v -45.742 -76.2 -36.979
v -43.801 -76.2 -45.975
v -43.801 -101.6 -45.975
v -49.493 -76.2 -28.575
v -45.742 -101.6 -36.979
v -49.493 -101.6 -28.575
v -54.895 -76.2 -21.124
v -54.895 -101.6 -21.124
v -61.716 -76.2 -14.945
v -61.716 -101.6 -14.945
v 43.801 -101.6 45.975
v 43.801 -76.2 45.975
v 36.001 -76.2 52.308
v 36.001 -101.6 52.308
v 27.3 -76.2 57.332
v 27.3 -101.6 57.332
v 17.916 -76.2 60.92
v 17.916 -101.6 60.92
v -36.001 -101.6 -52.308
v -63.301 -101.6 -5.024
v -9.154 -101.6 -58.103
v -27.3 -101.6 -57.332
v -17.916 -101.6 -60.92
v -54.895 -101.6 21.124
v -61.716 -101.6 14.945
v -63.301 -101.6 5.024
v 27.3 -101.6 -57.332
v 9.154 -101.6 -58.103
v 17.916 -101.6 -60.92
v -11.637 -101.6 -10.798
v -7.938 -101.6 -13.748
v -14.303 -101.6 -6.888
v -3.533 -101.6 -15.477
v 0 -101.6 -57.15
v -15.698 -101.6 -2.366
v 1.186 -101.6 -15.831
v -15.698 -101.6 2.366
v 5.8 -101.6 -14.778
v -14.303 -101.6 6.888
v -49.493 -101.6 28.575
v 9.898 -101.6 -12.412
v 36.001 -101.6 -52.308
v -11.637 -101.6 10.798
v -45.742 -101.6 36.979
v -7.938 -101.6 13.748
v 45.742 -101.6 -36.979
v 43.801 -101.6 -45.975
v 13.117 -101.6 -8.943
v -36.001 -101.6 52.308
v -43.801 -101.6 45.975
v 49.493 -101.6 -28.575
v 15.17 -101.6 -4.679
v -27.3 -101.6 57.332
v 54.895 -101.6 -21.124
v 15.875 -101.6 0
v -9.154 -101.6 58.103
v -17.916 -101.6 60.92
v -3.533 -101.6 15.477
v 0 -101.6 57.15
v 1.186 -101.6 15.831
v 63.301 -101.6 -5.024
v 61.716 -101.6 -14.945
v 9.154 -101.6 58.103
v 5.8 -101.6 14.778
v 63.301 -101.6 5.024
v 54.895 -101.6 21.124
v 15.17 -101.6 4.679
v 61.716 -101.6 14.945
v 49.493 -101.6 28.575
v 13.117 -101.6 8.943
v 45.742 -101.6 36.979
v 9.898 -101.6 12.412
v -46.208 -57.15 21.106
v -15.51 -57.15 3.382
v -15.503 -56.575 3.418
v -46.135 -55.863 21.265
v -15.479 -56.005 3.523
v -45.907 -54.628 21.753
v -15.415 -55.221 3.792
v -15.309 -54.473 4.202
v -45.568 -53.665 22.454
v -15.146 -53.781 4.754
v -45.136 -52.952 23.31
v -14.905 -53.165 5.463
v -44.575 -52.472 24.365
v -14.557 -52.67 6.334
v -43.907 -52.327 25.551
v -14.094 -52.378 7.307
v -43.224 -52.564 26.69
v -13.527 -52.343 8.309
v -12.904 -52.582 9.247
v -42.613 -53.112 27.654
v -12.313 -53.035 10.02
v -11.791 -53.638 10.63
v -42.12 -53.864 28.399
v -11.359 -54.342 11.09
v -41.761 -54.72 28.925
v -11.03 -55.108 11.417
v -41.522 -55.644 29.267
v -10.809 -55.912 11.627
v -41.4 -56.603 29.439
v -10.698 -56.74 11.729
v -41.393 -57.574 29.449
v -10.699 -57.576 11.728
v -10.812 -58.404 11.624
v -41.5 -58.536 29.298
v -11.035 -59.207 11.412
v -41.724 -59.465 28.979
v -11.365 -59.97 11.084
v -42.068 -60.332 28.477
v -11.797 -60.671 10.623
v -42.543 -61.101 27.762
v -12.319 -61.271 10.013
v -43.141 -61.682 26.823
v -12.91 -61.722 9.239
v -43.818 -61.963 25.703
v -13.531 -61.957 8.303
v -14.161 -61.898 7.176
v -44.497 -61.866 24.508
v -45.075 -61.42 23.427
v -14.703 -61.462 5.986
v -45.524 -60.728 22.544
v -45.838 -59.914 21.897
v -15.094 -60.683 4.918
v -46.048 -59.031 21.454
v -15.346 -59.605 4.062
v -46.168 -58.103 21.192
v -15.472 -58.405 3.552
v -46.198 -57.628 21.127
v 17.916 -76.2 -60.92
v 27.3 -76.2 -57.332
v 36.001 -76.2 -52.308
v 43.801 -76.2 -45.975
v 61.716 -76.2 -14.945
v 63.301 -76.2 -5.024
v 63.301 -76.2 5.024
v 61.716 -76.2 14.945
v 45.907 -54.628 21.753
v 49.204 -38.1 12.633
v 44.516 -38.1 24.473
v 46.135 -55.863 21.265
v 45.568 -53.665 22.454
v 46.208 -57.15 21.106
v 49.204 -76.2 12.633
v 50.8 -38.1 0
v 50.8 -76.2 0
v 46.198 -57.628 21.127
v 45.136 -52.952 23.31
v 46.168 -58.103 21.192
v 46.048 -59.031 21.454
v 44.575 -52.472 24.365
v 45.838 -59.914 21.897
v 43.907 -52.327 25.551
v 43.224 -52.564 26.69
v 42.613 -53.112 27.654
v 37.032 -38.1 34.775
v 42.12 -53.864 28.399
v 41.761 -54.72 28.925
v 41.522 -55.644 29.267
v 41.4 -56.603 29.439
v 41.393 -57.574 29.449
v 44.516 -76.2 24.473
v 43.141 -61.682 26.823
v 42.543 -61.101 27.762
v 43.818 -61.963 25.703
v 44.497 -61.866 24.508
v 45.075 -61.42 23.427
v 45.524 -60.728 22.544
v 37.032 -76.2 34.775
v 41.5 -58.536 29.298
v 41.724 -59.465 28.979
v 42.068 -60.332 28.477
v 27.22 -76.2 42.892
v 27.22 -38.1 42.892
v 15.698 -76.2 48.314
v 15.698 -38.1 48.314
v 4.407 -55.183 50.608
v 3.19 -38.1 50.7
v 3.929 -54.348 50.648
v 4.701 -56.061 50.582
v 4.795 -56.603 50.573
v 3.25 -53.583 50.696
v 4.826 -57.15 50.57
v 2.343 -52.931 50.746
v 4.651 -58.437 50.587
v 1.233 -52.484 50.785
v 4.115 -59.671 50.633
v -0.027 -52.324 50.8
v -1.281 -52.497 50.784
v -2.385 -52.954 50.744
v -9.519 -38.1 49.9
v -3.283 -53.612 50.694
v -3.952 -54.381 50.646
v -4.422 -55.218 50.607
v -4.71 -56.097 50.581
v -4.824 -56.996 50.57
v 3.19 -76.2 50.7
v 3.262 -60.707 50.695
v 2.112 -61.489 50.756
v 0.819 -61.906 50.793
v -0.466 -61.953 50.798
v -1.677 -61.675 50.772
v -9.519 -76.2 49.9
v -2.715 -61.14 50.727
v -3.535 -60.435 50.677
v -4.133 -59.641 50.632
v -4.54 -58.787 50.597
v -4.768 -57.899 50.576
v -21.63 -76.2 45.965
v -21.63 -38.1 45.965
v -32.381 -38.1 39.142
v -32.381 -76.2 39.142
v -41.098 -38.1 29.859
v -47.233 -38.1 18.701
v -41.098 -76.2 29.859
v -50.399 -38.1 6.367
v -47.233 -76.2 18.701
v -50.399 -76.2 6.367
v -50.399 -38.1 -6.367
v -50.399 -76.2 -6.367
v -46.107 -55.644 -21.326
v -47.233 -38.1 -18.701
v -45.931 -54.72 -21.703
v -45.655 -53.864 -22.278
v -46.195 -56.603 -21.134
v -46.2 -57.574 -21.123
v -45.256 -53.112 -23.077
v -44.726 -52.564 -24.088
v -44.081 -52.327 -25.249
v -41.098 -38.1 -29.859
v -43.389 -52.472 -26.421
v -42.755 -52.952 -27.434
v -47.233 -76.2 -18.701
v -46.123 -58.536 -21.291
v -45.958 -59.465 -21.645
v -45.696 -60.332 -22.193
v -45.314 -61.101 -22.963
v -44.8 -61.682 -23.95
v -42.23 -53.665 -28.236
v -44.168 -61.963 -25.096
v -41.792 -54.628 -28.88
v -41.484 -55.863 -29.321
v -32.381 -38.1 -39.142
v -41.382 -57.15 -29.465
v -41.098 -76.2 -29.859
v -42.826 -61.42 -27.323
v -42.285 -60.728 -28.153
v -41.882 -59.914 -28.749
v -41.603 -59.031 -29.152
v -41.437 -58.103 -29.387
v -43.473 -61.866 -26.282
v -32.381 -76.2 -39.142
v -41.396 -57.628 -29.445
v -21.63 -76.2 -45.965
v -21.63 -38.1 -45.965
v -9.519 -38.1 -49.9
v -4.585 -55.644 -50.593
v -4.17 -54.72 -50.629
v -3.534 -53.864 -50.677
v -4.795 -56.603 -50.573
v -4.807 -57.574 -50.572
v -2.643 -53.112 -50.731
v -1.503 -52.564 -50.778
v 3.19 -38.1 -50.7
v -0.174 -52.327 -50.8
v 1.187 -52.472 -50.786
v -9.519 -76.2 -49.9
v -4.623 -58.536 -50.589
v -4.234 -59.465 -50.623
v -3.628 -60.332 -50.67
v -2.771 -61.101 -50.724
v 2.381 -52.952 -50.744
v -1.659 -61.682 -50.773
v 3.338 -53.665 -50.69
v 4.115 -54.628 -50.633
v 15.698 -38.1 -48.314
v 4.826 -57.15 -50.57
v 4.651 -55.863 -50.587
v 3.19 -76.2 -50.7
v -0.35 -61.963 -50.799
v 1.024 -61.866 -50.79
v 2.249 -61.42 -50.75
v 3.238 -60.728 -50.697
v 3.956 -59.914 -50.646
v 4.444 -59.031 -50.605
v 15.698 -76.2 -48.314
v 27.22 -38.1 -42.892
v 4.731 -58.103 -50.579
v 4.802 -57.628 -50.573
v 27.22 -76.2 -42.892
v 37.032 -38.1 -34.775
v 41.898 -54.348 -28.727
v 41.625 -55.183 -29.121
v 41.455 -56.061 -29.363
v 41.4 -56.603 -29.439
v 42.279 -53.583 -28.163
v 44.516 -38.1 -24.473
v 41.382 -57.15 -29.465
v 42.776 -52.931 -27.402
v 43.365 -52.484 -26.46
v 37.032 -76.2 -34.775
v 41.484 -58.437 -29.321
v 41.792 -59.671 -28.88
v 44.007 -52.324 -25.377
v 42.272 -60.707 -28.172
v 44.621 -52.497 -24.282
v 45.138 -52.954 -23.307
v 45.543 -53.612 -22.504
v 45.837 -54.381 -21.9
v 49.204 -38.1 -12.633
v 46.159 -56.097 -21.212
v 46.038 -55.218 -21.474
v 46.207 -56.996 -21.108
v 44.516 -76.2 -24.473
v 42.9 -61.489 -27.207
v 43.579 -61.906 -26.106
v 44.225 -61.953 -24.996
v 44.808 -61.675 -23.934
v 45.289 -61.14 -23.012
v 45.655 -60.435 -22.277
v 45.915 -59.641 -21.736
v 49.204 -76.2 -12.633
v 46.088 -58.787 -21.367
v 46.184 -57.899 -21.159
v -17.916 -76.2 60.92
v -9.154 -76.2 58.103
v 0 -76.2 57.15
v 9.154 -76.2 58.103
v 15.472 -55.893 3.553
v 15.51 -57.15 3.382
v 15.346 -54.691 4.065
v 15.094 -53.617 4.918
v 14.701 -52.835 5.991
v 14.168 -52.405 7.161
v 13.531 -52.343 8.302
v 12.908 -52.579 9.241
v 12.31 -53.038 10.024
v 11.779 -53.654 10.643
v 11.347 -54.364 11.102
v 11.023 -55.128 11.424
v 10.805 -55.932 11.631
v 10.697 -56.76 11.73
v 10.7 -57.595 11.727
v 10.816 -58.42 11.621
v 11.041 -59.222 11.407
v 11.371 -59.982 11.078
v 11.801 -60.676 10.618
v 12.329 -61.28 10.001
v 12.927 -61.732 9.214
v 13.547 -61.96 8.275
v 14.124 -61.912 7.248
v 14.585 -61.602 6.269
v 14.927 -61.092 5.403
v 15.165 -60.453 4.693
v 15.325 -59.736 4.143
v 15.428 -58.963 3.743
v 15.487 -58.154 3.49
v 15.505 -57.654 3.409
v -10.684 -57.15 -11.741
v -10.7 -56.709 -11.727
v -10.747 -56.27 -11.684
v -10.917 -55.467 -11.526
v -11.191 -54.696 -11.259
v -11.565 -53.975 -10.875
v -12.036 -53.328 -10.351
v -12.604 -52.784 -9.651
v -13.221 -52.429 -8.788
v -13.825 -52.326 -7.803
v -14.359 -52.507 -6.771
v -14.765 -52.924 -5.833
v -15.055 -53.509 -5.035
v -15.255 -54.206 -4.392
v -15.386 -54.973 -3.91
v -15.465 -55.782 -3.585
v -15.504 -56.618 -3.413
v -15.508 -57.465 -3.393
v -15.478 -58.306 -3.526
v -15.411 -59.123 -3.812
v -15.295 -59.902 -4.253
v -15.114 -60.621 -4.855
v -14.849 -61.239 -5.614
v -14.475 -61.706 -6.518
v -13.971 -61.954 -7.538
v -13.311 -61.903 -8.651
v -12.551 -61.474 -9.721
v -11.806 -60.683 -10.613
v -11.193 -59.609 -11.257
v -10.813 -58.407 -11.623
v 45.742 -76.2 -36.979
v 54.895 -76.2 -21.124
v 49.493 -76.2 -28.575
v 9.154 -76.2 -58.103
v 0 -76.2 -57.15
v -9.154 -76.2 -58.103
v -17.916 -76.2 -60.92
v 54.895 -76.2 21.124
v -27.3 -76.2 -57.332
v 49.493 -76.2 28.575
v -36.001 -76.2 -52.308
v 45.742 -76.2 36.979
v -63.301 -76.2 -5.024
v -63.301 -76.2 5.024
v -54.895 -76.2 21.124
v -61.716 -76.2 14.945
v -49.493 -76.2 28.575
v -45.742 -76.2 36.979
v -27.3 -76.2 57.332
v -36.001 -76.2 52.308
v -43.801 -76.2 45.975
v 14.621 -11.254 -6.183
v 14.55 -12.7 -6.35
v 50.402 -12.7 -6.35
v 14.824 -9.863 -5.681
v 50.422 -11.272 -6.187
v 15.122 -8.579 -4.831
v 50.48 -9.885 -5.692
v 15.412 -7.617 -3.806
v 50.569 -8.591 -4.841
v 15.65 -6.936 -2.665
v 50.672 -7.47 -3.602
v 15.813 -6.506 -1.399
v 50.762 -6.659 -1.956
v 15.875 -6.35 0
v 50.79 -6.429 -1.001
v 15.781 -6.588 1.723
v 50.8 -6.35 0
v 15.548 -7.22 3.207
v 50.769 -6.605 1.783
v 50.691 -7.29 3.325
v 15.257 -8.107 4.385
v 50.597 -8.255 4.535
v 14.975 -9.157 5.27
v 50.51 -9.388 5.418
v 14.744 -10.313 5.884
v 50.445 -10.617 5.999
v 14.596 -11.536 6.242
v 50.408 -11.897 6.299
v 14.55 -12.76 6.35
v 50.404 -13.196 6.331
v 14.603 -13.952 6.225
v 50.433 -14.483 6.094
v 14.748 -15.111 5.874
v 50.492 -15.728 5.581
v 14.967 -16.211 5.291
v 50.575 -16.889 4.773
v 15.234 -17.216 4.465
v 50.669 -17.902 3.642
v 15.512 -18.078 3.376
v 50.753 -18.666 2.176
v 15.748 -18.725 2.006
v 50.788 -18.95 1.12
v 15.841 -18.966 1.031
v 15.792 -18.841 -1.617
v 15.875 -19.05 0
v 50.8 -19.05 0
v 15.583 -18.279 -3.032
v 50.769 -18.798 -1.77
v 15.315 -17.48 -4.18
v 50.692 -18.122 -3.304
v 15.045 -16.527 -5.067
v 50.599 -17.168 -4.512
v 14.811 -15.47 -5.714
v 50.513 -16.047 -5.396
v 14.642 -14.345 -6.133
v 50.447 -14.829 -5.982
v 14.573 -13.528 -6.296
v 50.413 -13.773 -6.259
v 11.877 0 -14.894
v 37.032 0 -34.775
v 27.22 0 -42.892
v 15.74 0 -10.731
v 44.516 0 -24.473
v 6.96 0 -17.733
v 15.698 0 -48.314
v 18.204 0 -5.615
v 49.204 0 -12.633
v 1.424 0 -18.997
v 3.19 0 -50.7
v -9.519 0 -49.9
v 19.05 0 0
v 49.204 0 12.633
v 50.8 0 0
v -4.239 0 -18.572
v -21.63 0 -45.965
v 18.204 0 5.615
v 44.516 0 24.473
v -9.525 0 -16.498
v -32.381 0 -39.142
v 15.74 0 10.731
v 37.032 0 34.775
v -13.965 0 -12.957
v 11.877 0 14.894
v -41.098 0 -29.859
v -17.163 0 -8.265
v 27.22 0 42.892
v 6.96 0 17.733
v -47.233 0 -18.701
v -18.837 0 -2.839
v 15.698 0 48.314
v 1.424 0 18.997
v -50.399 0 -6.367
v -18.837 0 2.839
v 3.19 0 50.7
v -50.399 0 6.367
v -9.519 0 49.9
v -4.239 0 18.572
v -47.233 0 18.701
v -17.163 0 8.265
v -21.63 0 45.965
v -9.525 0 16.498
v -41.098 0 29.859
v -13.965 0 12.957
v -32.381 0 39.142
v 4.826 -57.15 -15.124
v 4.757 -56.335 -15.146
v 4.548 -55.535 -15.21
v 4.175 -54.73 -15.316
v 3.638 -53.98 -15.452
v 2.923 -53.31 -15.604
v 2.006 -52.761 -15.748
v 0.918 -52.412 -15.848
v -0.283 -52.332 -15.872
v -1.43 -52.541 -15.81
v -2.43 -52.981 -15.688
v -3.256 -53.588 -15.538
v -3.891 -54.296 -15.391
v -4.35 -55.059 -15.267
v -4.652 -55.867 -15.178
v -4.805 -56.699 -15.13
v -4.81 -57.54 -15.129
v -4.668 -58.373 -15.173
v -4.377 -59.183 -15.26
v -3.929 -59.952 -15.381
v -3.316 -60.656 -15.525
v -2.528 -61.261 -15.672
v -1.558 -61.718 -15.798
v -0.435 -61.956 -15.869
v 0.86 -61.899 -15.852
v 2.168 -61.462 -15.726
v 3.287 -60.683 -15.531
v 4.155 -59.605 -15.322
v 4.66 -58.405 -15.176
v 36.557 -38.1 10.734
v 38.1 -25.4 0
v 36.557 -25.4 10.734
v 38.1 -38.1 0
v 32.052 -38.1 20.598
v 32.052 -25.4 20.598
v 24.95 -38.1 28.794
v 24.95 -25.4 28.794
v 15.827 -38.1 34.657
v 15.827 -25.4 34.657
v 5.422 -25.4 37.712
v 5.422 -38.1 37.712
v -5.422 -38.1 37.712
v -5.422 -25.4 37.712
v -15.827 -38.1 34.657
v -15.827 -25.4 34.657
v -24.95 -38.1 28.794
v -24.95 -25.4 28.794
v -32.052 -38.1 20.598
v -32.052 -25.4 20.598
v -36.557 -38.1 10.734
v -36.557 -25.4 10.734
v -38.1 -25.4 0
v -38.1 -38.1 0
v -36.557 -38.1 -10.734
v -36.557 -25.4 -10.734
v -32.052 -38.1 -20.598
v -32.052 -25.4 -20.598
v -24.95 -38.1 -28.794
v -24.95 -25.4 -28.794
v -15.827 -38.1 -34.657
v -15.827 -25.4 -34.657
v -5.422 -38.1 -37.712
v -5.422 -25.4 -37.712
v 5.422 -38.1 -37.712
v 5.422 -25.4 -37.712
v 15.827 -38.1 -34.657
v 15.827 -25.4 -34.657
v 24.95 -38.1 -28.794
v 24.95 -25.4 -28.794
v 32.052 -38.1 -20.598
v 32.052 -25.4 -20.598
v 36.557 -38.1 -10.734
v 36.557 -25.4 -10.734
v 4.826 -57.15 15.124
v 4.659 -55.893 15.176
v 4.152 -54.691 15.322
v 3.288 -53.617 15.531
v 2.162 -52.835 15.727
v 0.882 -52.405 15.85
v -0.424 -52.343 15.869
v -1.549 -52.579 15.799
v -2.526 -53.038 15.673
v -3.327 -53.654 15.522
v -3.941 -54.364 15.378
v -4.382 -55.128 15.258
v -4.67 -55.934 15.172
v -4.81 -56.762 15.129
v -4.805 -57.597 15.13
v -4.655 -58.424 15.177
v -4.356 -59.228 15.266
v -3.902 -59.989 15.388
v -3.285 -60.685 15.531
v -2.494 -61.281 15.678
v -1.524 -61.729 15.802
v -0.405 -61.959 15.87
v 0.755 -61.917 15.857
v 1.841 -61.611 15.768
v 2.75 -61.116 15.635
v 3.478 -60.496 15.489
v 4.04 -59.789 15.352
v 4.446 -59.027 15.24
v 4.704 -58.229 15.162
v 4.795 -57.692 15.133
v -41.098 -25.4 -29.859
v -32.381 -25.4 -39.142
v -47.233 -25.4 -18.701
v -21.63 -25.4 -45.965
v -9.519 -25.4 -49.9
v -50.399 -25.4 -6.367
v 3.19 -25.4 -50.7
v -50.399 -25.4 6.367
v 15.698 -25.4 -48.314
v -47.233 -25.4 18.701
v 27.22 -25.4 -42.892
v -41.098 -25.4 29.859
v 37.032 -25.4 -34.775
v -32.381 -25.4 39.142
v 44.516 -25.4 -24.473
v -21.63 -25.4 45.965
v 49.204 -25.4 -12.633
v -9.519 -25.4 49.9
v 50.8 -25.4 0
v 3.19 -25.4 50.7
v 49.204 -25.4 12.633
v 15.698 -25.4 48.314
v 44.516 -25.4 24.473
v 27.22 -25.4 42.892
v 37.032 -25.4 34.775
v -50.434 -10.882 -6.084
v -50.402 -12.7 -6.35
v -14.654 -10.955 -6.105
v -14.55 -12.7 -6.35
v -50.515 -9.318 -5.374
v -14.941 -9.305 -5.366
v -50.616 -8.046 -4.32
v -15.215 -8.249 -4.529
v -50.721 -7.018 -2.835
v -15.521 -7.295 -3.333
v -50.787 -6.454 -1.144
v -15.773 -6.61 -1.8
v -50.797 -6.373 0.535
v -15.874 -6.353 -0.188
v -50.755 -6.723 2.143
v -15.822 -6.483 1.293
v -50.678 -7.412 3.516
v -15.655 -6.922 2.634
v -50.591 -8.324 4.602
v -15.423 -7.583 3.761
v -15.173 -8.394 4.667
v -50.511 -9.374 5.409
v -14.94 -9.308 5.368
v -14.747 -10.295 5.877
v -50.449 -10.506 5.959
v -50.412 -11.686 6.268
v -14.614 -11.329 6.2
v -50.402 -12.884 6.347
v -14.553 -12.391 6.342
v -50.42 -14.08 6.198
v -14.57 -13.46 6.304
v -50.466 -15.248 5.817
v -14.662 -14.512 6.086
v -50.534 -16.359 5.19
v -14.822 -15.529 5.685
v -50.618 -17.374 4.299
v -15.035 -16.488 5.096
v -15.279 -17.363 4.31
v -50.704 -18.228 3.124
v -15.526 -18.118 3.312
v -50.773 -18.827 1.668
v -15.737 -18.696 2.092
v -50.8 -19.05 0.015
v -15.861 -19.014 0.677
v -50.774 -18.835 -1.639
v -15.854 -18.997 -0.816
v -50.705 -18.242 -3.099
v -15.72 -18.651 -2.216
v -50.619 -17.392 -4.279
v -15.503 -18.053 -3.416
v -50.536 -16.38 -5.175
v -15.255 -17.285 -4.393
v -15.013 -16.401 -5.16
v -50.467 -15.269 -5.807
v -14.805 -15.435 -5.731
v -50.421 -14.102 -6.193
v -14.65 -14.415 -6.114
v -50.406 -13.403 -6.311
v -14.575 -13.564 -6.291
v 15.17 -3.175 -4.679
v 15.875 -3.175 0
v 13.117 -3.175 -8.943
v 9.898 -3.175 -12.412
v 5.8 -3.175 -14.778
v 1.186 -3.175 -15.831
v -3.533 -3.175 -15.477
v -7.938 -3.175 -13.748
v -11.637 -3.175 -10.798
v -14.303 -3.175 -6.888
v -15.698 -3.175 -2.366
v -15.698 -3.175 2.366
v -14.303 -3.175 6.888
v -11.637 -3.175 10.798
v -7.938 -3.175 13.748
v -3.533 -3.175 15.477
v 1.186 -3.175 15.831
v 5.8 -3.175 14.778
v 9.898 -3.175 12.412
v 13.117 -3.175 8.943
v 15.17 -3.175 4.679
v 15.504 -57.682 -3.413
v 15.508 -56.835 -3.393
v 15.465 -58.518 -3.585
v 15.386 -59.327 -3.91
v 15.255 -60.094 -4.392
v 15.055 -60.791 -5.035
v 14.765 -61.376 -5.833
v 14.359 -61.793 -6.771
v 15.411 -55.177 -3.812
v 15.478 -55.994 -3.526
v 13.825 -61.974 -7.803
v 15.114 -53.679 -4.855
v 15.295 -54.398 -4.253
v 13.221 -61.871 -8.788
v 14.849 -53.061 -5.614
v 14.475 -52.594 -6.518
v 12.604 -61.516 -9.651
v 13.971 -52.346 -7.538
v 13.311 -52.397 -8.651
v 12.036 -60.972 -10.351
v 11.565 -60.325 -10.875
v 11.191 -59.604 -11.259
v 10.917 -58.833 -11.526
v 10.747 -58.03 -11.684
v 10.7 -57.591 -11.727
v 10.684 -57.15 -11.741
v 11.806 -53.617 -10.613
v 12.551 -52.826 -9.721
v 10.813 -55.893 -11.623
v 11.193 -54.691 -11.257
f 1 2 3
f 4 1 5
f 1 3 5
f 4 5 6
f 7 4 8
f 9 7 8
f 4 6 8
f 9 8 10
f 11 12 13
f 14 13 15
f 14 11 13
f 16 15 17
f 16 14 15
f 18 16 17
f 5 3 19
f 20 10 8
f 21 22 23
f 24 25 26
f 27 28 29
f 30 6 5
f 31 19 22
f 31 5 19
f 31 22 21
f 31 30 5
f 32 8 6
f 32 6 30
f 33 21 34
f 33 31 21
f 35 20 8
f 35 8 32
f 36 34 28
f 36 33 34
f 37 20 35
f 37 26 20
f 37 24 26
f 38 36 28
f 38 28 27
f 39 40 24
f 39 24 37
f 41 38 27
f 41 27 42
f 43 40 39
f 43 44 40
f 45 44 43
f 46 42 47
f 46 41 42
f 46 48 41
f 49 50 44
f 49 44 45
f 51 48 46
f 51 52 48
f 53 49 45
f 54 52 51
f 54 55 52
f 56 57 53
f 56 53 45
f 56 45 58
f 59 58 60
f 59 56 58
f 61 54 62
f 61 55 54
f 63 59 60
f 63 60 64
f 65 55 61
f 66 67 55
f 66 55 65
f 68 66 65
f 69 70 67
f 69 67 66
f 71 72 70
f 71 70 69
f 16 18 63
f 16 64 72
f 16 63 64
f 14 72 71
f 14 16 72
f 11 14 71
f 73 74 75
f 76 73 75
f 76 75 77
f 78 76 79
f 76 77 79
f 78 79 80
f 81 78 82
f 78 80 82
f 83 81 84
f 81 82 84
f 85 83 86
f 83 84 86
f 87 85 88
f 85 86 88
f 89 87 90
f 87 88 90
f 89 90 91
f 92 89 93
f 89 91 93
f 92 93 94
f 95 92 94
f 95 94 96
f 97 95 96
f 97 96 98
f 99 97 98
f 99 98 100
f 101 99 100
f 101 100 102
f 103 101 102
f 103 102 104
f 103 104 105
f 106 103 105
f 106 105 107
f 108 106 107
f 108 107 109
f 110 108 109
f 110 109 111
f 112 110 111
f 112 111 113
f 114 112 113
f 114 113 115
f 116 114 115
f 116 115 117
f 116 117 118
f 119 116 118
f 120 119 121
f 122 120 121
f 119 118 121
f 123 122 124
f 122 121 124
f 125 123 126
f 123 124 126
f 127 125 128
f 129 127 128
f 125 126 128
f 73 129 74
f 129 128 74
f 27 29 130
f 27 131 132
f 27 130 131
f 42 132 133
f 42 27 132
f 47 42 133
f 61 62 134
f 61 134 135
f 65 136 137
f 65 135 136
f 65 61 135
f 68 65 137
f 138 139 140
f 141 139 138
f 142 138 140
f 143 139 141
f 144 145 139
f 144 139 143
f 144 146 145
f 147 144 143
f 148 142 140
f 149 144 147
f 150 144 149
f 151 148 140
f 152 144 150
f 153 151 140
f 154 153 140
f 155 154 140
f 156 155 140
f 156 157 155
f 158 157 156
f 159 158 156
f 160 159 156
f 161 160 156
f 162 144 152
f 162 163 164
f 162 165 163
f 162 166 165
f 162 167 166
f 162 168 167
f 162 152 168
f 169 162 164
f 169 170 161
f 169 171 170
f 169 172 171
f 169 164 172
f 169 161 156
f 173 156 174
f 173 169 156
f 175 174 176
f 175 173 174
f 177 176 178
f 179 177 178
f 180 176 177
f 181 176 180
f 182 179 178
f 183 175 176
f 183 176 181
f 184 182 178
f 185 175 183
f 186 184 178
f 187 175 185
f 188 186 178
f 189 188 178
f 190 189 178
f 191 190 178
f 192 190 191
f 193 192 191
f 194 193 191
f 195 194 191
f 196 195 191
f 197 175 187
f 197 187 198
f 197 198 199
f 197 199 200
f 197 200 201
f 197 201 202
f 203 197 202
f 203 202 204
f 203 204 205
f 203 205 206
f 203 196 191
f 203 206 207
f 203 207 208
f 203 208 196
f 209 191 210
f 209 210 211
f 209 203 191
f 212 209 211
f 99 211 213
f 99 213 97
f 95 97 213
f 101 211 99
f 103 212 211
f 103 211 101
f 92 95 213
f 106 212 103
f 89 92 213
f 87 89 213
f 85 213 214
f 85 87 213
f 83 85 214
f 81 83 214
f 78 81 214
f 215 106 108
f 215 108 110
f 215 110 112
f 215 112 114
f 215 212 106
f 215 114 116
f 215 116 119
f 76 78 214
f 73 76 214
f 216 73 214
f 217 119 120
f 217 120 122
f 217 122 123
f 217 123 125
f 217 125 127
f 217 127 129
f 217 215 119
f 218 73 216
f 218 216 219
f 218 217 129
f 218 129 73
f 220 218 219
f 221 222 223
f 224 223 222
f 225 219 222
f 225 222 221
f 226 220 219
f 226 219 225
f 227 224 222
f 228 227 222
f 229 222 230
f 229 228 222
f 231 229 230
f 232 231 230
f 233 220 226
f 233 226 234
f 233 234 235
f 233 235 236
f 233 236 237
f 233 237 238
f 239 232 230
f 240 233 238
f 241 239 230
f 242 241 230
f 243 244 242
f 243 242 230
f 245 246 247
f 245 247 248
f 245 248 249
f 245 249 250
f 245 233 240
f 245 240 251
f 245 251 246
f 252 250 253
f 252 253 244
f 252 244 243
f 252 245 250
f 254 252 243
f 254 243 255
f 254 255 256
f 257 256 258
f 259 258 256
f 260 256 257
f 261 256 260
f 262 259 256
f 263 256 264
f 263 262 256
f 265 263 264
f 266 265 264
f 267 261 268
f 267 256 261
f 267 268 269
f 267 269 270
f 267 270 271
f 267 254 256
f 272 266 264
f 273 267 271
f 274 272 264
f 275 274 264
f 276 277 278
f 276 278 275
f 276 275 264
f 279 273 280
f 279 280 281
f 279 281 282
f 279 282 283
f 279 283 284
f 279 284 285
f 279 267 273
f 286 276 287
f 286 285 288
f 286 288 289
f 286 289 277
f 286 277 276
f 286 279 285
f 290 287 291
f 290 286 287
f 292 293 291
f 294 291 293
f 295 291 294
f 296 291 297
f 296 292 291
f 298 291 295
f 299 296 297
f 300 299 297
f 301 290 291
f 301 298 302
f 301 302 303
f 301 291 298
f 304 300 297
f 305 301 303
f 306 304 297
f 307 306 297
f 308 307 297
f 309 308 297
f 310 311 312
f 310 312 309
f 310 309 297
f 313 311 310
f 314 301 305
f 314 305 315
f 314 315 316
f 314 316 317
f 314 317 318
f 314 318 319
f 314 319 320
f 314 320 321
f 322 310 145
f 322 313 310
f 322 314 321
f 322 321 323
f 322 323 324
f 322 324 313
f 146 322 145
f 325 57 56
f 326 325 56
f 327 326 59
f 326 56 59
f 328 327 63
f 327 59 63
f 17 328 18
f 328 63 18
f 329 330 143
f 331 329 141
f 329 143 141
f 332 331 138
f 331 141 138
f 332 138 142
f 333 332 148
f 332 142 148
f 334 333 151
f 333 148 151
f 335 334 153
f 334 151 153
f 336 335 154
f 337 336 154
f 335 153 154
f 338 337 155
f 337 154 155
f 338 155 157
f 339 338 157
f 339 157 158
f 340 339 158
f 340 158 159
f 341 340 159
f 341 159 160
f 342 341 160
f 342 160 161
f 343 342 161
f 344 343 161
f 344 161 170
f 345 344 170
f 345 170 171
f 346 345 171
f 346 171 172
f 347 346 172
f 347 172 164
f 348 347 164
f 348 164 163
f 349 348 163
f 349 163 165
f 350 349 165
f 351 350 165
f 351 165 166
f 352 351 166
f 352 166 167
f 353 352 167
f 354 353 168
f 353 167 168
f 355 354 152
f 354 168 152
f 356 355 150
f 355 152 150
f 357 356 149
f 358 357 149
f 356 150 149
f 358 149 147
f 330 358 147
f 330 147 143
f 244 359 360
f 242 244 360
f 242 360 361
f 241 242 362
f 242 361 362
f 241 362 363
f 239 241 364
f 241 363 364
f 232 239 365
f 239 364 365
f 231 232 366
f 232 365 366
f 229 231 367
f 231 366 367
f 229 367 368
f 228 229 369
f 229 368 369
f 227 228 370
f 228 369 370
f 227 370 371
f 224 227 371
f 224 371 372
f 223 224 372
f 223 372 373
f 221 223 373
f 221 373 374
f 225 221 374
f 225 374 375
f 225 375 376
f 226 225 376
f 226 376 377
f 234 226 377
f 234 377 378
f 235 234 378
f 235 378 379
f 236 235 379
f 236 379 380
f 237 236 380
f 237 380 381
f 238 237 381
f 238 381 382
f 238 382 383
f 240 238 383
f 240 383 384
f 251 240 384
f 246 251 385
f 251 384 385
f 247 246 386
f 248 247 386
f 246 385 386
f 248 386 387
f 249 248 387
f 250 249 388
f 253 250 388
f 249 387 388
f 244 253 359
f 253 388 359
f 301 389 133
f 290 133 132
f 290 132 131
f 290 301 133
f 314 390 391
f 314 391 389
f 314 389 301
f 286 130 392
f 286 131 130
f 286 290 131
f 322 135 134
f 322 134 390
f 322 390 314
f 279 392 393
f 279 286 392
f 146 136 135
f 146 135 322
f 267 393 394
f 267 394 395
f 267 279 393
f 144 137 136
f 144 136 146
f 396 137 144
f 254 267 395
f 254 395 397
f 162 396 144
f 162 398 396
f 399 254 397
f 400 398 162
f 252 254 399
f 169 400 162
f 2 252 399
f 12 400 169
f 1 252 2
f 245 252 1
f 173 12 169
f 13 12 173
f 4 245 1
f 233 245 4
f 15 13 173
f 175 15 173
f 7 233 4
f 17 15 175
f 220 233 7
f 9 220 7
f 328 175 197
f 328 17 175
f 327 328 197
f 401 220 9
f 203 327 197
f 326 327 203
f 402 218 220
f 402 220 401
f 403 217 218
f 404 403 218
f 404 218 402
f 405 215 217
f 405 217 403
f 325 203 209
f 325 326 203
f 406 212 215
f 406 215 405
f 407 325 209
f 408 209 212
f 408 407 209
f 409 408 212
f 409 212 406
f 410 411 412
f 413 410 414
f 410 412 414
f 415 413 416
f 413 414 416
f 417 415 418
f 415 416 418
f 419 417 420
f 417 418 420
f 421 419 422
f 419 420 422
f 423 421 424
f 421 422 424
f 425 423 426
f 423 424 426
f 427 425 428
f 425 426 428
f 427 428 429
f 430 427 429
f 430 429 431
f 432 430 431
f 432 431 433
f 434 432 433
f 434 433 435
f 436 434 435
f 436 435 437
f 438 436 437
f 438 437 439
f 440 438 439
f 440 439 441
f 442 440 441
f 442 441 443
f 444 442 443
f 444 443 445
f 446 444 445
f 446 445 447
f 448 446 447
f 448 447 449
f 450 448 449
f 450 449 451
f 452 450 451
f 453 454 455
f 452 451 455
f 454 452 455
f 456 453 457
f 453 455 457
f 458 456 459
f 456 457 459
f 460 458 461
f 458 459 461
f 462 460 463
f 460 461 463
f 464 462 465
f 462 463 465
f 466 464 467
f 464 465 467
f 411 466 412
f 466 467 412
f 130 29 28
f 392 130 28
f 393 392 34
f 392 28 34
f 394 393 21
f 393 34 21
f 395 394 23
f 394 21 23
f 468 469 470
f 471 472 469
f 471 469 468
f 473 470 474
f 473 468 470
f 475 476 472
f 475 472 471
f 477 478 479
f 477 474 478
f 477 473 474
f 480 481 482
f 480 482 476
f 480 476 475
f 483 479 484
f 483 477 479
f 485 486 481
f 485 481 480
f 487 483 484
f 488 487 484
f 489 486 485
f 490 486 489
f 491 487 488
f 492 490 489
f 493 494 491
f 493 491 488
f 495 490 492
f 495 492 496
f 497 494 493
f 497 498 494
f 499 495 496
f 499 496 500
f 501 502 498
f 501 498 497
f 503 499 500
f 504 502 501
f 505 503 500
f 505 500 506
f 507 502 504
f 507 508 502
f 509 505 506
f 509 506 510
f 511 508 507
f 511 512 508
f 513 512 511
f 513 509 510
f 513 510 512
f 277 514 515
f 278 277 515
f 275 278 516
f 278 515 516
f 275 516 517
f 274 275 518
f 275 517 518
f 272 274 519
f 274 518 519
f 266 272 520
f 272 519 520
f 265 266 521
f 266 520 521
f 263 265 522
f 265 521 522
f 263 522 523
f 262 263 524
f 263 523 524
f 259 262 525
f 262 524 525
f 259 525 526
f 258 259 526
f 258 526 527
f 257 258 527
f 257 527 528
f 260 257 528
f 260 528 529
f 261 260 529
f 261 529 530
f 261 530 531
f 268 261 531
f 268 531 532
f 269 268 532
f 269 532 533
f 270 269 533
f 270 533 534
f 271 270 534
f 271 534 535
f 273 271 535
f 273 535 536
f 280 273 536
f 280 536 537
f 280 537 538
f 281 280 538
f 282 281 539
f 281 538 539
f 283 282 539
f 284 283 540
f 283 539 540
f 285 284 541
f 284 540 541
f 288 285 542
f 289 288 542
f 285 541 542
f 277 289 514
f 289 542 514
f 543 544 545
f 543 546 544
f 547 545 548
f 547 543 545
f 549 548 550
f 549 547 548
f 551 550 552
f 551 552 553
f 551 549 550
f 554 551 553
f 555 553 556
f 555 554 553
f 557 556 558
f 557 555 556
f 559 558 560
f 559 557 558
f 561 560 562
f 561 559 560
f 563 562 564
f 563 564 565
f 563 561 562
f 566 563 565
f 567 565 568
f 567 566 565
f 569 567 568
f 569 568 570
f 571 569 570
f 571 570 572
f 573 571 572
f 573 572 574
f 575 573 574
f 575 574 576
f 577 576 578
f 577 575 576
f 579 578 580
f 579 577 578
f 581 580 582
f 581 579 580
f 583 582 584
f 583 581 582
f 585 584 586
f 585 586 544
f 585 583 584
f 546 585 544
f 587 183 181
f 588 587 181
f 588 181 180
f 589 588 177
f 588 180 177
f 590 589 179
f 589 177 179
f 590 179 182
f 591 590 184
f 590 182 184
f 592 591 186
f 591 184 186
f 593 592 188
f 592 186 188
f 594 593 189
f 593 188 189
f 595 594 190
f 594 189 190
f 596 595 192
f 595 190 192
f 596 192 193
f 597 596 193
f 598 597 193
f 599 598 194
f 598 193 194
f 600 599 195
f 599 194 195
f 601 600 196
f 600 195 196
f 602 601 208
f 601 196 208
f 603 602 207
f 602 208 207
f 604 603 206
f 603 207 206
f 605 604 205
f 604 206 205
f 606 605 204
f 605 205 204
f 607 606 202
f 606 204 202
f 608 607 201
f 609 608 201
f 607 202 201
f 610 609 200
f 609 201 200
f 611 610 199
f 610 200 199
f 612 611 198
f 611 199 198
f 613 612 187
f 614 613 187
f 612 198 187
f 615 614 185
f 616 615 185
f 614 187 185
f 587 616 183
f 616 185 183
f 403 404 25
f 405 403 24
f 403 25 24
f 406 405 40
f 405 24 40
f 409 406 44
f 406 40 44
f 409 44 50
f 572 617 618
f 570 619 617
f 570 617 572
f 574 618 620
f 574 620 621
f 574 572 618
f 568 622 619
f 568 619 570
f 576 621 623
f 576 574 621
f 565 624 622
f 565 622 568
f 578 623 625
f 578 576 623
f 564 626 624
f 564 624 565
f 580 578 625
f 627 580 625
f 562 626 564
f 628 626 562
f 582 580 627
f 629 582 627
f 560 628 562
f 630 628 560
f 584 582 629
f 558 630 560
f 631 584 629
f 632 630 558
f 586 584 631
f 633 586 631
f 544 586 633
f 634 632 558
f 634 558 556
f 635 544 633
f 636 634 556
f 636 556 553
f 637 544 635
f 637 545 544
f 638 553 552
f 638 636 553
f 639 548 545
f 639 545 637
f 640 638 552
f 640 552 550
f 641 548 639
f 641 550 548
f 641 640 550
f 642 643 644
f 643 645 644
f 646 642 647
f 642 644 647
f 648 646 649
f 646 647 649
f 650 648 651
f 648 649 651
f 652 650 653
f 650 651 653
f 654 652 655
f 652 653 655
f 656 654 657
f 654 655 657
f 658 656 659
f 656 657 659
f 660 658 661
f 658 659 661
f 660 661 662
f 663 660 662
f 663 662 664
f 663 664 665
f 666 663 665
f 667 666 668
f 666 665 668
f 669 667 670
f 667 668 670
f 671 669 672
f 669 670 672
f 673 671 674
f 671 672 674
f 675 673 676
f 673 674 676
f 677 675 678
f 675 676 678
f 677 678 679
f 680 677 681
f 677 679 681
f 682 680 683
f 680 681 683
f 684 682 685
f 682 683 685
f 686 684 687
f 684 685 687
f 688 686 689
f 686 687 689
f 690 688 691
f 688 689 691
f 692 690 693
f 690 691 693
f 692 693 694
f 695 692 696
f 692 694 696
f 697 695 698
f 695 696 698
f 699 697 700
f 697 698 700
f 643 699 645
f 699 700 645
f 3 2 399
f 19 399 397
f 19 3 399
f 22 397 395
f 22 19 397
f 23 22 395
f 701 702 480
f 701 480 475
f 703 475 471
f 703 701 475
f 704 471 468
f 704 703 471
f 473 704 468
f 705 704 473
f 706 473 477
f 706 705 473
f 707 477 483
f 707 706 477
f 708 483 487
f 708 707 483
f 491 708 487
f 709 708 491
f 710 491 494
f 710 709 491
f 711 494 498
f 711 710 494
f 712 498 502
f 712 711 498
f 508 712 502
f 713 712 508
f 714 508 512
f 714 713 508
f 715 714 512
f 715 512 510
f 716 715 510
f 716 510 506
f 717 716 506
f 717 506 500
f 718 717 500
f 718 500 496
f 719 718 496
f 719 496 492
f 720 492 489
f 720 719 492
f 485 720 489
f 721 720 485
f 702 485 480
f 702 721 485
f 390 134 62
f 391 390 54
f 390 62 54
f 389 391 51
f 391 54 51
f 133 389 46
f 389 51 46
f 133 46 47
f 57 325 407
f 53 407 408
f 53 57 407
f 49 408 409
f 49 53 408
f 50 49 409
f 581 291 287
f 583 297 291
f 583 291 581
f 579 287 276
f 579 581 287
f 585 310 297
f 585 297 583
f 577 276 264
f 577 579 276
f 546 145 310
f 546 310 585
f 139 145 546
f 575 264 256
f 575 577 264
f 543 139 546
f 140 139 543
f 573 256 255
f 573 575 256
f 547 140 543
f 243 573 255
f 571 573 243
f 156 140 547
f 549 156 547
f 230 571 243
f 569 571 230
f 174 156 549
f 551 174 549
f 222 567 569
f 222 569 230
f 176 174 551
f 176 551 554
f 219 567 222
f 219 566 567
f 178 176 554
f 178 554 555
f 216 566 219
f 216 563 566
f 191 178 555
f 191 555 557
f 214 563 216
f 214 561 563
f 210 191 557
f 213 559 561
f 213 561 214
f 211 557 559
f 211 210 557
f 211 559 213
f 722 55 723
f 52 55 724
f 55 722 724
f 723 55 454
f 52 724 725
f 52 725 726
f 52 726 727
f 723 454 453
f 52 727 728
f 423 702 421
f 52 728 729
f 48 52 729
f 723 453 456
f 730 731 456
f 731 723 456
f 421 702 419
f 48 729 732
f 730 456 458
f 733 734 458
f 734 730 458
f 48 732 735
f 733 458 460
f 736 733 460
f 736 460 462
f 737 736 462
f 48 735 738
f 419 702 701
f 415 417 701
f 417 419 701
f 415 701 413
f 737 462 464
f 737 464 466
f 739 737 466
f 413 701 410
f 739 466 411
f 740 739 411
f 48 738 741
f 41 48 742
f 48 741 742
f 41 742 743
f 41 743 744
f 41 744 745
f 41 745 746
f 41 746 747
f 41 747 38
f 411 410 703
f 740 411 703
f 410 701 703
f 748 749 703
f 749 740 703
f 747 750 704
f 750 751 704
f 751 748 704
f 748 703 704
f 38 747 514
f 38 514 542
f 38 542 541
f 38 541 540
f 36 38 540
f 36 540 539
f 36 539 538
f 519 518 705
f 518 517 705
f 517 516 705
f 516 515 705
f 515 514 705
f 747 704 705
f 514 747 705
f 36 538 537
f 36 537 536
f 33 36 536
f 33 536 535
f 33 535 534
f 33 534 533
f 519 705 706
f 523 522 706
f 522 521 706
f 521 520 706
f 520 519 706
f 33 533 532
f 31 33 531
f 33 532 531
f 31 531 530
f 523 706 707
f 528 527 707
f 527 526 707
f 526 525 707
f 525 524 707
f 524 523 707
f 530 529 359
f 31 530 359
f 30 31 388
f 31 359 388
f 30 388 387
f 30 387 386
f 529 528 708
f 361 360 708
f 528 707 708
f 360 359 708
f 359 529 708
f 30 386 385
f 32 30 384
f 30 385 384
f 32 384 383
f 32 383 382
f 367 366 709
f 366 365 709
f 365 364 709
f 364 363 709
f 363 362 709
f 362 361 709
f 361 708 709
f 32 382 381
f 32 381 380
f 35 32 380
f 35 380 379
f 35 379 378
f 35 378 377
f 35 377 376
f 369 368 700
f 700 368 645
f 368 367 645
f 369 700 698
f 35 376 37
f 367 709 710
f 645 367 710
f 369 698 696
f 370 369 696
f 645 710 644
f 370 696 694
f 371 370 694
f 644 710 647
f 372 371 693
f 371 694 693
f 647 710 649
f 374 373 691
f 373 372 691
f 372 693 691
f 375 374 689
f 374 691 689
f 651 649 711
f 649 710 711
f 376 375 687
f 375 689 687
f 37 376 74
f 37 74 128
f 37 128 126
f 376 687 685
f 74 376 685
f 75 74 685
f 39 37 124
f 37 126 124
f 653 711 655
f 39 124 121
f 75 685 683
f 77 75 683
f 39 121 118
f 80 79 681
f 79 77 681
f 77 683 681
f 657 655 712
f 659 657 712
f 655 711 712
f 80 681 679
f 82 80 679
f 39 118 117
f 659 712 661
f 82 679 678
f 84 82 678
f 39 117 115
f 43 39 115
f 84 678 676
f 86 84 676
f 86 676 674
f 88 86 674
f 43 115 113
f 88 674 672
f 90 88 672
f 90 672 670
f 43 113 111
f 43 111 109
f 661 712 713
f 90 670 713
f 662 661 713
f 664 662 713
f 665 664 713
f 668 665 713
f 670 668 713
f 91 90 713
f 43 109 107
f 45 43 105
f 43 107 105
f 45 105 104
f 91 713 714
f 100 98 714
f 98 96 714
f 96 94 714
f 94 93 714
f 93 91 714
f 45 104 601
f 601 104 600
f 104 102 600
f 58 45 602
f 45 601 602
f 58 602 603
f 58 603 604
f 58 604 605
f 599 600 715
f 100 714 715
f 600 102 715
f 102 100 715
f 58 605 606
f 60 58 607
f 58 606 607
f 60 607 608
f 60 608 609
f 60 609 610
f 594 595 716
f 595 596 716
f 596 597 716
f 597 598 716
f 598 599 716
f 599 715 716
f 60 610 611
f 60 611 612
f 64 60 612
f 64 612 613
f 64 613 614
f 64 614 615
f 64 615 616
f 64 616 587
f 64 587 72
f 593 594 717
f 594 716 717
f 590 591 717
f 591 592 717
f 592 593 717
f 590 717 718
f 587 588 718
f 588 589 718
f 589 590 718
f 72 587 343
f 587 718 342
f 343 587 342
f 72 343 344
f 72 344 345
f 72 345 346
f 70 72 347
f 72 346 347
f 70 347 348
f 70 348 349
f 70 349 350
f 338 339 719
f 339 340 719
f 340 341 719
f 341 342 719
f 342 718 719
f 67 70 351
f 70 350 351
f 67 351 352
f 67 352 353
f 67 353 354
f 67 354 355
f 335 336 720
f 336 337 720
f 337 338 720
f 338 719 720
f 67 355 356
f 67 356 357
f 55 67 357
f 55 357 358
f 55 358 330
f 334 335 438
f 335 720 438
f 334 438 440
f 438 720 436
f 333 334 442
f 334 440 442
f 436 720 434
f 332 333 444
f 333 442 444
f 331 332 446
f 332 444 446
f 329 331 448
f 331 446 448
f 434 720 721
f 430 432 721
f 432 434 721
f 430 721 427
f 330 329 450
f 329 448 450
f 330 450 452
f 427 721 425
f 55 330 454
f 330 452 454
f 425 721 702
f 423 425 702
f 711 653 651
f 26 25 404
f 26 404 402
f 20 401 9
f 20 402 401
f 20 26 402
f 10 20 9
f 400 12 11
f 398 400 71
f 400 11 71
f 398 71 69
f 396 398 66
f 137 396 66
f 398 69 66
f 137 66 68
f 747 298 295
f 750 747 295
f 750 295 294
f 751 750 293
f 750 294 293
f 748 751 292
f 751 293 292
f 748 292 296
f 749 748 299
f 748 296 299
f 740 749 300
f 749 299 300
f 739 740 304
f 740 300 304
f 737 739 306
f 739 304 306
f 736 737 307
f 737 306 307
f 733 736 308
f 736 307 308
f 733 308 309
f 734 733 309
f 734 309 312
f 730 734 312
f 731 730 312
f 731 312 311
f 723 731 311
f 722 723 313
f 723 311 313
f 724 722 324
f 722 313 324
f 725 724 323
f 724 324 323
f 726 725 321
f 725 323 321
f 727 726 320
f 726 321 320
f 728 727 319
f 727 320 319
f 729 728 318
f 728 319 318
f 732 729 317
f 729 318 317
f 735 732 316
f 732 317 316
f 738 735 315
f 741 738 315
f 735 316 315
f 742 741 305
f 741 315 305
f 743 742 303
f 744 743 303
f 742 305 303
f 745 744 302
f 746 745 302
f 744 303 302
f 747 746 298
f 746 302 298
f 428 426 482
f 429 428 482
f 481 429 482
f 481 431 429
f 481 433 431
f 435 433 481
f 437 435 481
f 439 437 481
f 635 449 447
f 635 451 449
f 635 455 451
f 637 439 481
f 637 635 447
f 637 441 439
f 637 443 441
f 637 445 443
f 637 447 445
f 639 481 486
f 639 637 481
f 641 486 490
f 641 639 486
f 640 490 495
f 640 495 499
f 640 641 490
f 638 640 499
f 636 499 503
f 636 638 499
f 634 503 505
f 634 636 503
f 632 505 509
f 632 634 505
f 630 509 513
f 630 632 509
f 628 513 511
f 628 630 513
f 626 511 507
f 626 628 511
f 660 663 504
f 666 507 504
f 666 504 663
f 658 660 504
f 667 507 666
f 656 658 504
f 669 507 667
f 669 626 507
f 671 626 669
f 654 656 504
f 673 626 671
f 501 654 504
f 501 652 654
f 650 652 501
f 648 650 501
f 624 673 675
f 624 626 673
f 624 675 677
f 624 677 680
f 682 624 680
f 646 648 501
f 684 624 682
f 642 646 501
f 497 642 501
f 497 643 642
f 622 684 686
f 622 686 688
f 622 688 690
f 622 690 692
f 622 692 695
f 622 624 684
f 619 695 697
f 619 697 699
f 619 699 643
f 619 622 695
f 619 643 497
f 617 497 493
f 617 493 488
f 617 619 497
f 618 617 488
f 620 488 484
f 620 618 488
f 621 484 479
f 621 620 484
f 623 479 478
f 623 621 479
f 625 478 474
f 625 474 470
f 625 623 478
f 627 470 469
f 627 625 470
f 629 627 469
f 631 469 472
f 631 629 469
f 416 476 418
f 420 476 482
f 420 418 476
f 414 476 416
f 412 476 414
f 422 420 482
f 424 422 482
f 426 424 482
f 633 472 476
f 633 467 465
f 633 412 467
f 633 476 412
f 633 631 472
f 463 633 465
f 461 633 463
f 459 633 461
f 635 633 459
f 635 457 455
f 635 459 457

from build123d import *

# Parameters (mm, degrees)
CUT_EXTRUDE1_REACH = 103.6
CUT_EXTRUDE2_REACH = 103.6
SKETCH3_R          = 15.875
CHAMFER1_SIZE      = 3.175
SKETCH4_R          = 6.35
CUT_EXTRUDE3_DEPTH = 50.8
SKETCH5_R          = 4.826
CUT_EXTRUDE4_DEPTH = 50.8
CIRPATTERN1_COUNT  = 6


with BuildPart() as part:
    # Sketch1 → Revolve1 (revolve)
    with BuildSketch(Plane.XY):
        Polygon((0, 0), (50.8, 0), (50.8, -25.4), (38.1, -25.4), (38.1, -38.1), (50.8, -38.1), (50.8, -76.2), (63.5, -76.2), (63.5, -101.6), (0, -101.6), align=None)
    revolve(axis=Axis((0, 0, 0), (0, -1, 0)))

    # Sketch2 → Cut-Extrude1 (cut, up to next)
    with BuildSketch(Plane.XZ.offset(101.6), mode=Mode.PRIVATE) as cut_extrude1_sk1:
        with BuildLine():
            ThreePointArc((-17.915510735, 60.9203125), (0, 57.15), (17.915510735, 60.9203125))
            ThreePointArc((17.915510735, 60.9203125), (0, 63.5), (-17.915510735, 60.9203125))
        make_face()
    cut_extrude1_tool1 = extrude(cut_extrude1_sk1.sketch, amount=-CUT_EXTRUDE1_REACH, mode=Mode.PRIVATE) & part.part
    add(cut_extrude1_tool1.solids().sort_by_distance((0, -101.6, 60.438615))[0], mode=Mode.SUBTRACT)
    # Sketch2 → Cut-Extrude1 (cut, up to next)
    with BuildSketch(Plane.XZ.offset(101.6), mode=Mode.PRIVATE) as cut_extrude1_sk2:
        with BuildLine():
            ThreePointArc((-43.800782864, 45.975443668), (-54.99261314, 31.75), (-61.716293599, 14.944868832))
            ThreePointArc((-61.716293599, 14.944868832), (-49.493351826, 28.575), (-43.800782864, 45.975443668))
        make_face()
    cut_extrude1_tool2 = extrude(cut_extrude1_sk2.sketch, amount=-CUT_EXTRUDE1_REACH, mode=Mode.PRIVATE) & part.part
    add(cut_extrude1_tool2.solids().sort_by_distance((-52.341376, -101.6, 30.219308))[0], mode=Mode.SUBTRACT)
    # Sketch2 → Cut-Extrude1 (cut, up to next)
    with BuildSketch(Plane.XZ.offset(101.6), mode=Mode.PRIVATE) as cut_extrude1_sk3:
        with BuildLine():
            ThreePointArc((43.800782864, 45.975443668), (49.493351826, 28.575), (61.716293599, 14.944868832))
            ThreePointArc((61.716293599, 14.944868832), (54.99261314, 31.75), (43.800782864, 45.975443668))
        make_face()
    cut_extrude1_tool3 = extrude(cut_extrude1_sk3.sketch, amount=-CUT_EXTRUDE1_REACH, mode=Mode.PRIVATE) & part.part
    add(cut_extrude1_tool3.solids().sort_by_distance((52.341376, -101.6, 30.219308))[0], mode=Mode.SUBTRACT)
    # Sketch2 → Cut-Extrude1 (cut, up to next)
    with BuildSketch(Plane.XZ.offset(101.6), mode=Mode.PRIVATE) as cut_extrude1_sk4:
        with BuildLine():
            ThreePointArc((61.716293599, -14.944868832), (49.493351826, -28.575), (43.800782864, -45.975443668))
            ThreePointArc((43.800782864, -45.975443668), (54.99261314, -31.75), (61.716293599, -14.944868832))
        make_face()
    cut_extrude1_tool4 = extrude(cut_extrude1_sk4.sketch, amount=-CUT_EXTRUDE1_REACH, mode=Mode.PRIVATE) & part.part
    add(cut_extrude1_tool4.solids().sort_by_distance((52.341376, -101.6, -30.219308))[0], mode=Mode.SUBTRACT)
    # Sketch2 → Cut-Extrude1 (cut, up to next)
    with BuildSketch(Plane.XZ.offset(101.6), mode=Mode.PRIVATE) as cut_extrude1_sk5:
        with BuildLine():
            ThreePointArc((17.915510735, -60.9203125), (0, -57.15), (-17.915510735, -60.9203125))
            ThreePointArc((-17.915510735, -60.9203125), (0, -63.5), (17.915510735, -60.9203125))
        make_face()
    cut_extrude1_tool5 = extrude(cut_extrude1_sk5.sketch, amount=-CUT_EXTRUDE1_REACH, mode=Mode.PRIVATE) & part.part
    add(cut_extrude1_tool5.solids().sort_by_distance((0, -101.6, -60.438615))[0], mode=Mode.SUBTRACT)
    # Sketch2 → Cut-Extrude1 (cut, up to next)
    with BuildSketch(Plane.XZ.offset(101.6), mode=Mode.PRIVATE) as cut_extrude1_sk6:
        with BuildLine():
            ThreePointArc((-43.800782864, -45.975443668), (-49.493351826, -28.575), (-61.716293599, -14.944868832))
            ThreePointArc((-61.716293599, -14.944868832), (-54.99261314, -31.75), (-43.800782864, -45.975443668))
        make_face()
    cut_extrude1_tool6 = extrude(cut_extrude1_sk6.sketch, amount=-CUT_EXTRUDE1_REACH, mode=Mode.PRIVATE) & part.part
    add(cut_extrude1_tool6.solids().sort_by_distance((-52.341376, -101.6, -30.219308))[0], mode=Mode.SUBTRACT)

    # Sketch3 → Cut-Extrude2 (cut, up to next)
    with BuildSketch(Plane(origin=(0, 0, 0), x_dir=(1, 0, 0), z_dir=(0, 1, 0)), mode=Mode.PRIVATE) as cut_extrude2_sk1:
        Circle(SKETCH3_R)
    cut_extrude2_tool1 = extrude(cut_extrude2_sk1.sketch, amount=-CUT_EXTRUDE2_REACH, mode=Mode.PRIVATE) & part.part
    add(cut_extrude2_tool1.solids().sort_by_distance((0, 0, 0))[0], mode=Mode.SUBTRACT)

    # Chamfer1
    chamfer1_edges = [part.edges().sort_by_distance(p)[0] for p in [
        (-15.875, 0, 0),
    ]]
    chamfer(chamfer1_edges, length=CHAMFER1_SIZE)

    # Sketch4 → Cut-Extrude3 (cut, symmetric)
    with BuildSketch(Plane(origin=(0, 0, 0), x_dir=(0, 0, -1), z_dir=(1, 0, 0))):
        with Locations((0, -12.7)):
            Circle(SKETCH4_R)
    extrude(amount=CUT_EXTRUDE3_DEPTH, both=True, mode=Mode.SUBTRACT)

    # Sketch5 → Cut-Extrude4 (cut, symmetric)
    with BuildSketch(Plane.XY):
        with Locations((0, -57.15)):
            Circle(SKETCH5_R)
    cut_extrude4 = extrude(amount=CUT_EXTRUDE4_DEPTH, both=True, mode=Mode.SUBTRACT)

    # CirPattern1: Cut-Extrude4 ×6 about axis
    cirpattern1_axis = Axis((0, -38.1, 0), (0, 1, 0))
    for i in range(1, CIRPATTERN1_COUNT):
        add(cut_extrude4.rotate(cirpattern1_axis, i * 360 / CIRPATTERN1_COUNT), mode=Mode.SUBTRACT)


solid = part.part
